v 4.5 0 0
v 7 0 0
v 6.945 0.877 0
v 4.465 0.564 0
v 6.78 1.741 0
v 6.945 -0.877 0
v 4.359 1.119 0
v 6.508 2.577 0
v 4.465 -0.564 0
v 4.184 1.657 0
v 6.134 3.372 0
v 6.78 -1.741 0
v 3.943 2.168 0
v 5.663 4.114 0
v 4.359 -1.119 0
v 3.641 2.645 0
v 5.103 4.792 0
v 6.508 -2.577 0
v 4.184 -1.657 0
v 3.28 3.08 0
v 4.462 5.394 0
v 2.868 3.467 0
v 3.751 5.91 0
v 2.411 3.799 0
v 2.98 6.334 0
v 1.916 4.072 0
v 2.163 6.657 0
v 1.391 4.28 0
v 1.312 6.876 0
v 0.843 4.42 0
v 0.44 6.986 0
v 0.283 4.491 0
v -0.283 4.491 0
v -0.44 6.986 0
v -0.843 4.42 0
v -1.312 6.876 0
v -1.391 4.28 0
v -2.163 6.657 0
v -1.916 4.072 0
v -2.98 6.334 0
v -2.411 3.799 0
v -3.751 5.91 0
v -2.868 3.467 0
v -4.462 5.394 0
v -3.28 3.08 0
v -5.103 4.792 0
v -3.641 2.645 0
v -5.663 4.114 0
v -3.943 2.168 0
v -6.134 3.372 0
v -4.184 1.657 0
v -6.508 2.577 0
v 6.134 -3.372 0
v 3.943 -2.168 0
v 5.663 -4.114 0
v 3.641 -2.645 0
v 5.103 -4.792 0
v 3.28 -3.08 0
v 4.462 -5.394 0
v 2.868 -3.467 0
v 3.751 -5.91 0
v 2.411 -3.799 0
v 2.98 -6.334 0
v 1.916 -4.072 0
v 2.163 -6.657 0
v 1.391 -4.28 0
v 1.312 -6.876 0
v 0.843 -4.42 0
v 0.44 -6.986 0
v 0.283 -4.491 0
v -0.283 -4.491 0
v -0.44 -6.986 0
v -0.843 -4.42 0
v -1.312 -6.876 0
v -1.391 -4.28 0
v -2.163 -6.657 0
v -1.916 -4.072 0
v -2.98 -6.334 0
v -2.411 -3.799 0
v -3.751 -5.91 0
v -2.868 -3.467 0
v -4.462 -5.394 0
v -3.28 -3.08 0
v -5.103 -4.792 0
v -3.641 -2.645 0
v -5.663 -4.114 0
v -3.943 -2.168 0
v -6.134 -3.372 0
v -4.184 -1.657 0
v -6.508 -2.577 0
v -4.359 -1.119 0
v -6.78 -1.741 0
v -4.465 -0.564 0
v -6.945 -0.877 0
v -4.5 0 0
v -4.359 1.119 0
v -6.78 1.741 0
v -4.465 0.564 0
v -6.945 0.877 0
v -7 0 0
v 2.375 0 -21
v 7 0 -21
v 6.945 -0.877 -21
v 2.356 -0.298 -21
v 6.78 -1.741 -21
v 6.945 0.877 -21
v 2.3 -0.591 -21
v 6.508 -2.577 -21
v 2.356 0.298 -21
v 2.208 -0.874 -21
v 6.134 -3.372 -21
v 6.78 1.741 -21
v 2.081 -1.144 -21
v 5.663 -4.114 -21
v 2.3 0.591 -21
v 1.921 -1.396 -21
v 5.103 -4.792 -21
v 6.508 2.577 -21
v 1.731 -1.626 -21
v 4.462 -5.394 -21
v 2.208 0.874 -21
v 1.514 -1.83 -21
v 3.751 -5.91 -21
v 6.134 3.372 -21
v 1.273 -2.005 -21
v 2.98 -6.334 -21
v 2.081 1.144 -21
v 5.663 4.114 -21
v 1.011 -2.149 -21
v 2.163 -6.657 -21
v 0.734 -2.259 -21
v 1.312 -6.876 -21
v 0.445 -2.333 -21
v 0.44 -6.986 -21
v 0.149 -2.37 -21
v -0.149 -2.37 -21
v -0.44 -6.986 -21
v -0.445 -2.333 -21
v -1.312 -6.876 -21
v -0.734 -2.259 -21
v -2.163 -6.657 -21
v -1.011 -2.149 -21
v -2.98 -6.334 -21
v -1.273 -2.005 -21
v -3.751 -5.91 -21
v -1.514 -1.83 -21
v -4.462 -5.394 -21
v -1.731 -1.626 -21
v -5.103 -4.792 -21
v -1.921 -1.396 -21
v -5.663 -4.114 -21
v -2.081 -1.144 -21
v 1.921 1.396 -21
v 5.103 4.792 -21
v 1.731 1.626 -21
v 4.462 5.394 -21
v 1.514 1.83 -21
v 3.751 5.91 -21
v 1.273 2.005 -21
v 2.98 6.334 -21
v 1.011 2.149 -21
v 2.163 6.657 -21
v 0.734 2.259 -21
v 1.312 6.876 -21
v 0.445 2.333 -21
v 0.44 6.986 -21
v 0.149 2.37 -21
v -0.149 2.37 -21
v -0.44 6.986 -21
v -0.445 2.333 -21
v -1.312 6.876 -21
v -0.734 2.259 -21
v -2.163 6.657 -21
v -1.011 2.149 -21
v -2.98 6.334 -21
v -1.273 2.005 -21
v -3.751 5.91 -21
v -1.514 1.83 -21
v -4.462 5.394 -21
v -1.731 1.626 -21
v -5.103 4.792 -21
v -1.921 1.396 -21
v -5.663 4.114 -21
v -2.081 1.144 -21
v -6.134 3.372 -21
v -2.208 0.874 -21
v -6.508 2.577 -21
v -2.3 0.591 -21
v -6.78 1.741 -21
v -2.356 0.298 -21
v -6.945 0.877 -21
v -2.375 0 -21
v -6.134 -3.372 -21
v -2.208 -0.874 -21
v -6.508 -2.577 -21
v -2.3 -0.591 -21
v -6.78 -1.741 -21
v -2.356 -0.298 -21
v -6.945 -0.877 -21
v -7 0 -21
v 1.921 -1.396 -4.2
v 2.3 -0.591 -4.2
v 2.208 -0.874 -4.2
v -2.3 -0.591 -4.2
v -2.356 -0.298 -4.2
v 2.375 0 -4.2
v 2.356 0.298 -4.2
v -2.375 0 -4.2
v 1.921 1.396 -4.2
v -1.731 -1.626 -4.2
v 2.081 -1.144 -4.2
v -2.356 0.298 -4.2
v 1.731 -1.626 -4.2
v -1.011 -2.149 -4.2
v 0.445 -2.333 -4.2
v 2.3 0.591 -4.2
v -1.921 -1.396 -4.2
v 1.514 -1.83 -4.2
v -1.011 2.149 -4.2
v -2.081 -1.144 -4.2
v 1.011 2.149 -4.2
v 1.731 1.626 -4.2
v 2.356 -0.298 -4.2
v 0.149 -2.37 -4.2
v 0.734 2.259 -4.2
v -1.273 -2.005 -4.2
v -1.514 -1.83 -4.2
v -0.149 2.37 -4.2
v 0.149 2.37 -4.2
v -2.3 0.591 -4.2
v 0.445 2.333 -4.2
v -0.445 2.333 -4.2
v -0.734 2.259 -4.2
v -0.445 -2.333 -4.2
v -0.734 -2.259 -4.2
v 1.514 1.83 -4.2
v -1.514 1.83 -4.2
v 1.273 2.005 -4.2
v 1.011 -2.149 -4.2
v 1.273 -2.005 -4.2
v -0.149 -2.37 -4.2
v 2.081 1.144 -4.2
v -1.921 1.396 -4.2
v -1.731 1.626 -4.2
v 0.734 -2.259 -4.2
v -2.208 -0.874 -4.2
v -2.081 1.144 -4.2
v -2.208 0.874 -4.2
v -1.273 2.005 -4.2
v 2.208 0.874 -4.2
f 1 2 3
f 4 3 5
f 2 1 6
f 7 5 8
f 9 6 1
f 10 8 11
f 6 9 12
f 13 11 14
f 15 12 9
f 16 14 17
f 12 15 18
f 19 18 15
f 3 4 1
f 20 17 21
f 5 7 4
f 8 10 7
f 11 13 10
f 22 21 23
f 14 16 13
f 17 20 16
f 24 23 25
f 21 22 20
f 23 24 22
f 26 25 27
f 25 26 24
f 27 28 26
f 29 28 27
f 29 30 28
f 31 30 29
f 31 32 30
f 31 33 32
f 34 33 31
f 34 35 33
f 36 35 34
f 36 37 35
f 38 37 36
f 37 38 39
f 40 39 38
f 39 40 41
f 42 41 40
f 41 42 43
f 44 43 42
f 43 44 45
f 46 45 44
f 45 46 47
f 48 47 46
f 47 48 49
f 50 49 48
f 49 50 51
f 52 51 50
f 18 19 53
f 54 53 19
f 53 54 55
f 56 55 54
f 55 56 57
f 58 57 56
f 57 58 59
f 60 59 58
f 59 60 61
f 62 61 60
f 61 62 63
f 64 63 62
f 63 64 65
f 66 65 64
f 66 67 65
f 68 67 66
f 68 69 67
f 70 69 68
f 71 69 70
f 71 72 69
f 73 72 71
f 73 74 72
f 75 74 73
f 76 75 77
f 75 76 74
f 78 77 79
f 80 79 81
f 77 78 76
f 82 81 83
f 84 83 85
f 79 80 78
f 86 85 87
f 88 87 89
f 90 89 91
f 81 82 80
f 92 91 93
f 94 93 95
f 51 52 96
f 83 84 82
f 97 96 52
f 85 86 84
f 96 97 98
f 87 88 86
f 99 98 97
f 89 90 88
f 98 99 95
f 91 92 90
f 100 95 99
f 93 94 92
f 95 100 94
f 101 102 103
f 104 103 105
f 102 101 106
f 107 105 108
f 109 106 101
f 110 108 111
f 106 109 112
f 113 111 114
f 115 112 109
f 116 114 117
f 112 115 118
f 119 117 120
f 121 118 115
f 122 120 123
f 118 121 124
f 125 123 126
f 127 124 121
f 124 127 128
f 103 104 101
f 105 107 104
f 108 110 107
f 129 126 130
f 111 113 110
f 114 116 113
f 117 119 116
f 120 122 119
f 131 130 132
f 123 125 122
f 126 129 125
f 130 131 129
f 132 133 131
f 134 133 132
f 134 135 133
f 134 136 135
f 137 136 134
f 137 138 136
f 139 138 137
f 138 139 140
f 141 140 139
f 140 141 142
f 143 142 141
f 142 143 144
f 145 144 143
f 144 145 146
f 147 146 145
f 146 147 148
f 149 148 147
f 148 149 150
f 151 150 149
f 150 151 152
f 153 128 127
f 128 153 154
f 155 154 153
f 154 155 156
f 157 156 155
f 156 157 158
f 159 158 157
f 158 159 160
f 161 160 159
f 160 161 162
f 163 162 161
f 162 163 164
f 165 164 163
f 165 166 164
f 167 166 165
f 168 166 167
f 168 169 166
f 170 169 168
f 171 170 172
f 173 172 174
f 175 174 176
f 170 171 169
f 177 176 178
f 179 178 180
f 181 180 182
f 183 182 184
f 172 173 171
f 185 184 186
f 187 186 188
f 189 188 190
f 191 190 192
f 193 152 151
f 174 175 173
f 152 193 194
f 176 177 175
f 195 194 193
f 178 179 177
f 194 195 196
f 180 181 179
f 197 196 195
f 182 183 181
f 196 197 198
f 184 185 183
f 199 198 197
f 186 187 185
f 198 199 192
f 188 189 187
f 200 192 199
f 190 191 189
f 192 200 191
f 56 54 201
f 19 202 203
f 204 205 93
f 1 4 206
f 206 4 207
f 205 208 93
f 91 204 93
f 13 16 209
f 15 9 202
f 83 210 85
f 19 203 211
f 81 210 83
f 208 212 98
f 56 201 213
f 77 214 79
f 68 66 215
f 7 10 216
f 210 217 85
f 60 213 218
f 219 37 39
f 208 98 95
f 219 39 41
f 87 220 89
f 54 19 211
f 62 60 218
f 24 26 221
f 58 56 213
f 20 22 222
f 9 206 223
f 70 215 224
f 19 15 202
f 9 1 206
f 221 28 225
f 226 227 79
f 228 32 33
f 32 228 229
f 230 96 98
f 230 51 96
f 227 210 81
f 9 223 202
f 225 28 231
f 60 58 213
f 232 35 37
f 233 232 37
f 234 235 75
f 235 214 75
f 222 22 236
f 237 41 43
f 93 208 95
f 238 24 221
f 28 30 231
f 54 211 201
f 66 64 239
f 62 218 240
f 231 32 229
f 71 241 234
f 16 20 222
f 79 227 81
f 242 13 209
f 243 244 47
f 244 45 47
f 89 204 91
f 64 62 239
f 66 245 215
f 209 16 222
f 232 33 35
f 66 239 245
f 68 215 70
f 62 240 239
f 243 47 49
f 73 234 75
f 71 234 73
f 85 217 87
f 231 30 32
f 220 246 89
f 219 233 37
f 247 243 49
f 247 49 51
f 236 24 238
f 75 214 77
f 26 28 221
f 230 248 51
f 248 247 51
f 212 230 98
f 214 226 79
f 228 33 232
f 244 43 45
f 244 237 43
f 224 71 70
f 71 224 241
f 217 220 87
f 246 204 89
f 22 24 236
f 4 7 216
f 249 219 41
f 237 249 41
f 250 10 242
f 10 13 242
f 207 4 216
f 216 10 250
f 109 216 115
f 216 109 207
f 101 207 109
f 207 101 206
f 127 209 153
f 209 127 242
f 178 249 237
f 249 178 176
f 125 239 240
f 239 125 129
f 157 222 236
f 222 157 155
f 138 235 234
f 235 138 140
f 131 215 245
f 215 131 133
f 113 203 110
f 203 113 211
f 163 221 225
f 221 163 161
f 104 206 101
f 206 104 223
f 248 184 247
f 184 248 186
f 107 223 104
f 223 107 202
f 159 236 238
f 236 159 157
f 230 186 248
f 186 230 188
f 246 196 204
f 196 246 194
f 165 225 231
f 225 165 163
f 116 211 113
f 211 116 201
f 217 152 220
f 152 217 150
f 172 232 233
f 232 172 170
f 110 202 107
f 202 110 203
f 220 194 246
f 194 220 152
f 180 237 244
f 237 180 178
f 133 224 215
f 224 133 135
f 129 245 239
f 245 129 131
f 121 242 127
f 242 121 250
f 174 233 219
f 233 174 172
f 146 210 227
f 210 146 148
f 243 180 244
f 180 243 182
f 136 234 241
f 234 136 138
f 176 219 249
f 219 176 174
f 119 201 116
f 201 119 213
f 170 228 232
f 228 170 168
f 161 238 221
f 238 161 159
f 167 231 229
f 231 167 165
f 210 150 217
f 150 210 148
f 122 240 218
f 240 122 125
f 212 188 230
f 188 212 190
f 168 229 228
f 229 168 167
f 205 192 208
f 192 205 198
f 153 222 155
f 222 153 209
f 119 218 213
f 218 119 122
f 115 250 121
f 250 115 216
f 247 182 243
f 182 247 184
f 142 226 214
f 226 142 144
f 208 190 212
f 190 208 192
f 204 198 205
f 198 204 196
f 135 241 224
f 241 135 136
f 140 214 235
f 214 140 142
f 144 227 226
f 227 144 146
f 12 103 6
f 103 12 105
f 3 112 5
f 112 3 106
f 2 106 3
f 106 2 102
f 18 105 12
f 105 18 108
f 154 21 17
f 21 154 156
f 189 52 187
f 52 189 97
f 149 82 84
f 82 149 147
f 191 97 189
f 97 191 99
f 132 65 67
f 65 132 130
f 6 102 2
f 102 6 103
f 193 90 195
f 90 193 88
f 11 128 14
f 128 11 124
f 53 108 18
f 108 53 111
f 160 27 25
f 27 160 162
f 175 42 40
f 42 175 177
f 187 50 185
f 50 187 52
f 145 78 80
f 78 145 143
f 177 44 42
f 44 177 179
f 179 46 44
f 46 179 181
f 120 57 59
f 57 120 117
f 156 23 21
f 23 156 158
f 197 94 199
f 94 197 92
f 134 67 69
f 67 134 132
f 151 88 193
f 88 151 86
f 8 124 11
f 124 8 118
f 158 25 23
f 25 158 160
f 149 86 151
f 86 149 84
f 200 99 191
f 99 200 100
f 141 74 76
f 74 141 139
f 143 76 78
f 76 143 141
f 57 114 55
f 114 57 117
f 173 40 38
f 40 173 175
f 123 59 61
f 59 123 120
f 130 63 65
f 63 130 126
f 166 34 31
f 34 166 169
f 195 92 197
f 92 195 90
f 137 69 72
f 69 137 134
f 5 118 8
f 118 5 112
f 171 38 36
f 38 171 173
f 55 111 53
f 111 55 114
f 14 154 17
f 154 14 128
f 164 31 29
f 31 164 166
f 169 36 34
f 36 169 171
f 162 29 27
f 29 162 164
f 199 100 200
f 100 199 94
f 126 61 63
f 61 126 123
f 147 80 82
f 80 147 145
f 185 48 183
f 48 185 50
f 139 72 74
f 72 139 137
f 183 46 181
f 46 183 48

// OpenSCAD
$fn = 50;


difference() {
	union() {
		translate(v = [0, 0, -21.0000000000]) {
			cylinder(h = 21, r = 7.0000000000);
		}
		cylinder(h = 0, r = 13.0000000000);
	}
	union() {
		translate(v = [0, 0, 0]) {
			rotate(a = [0, 0, 0]) {
				difference() {
					union() {
						#translate(v = [0, 0, -21.0000000000]) {
							cylinder(h = 21, r = 2.2500000000);
						}
						#translate(v = [0, 0, -4.2000000000]) {
							cylinder(h = 4.2000000000, r1 = 2.3750000000, r2 = 4.5000000000);
						}
						#translate(v = [0, 0, -21.0000000000]) {
							cylinder(h = 21, r = 2.3750000000);
						}
						#translate(v = [0, 0, -21.0000000000]) {
							cylinder(h = 21, r = 2.2500000000);
						}
					}
					union();
				}
			}
		}
	}
}
